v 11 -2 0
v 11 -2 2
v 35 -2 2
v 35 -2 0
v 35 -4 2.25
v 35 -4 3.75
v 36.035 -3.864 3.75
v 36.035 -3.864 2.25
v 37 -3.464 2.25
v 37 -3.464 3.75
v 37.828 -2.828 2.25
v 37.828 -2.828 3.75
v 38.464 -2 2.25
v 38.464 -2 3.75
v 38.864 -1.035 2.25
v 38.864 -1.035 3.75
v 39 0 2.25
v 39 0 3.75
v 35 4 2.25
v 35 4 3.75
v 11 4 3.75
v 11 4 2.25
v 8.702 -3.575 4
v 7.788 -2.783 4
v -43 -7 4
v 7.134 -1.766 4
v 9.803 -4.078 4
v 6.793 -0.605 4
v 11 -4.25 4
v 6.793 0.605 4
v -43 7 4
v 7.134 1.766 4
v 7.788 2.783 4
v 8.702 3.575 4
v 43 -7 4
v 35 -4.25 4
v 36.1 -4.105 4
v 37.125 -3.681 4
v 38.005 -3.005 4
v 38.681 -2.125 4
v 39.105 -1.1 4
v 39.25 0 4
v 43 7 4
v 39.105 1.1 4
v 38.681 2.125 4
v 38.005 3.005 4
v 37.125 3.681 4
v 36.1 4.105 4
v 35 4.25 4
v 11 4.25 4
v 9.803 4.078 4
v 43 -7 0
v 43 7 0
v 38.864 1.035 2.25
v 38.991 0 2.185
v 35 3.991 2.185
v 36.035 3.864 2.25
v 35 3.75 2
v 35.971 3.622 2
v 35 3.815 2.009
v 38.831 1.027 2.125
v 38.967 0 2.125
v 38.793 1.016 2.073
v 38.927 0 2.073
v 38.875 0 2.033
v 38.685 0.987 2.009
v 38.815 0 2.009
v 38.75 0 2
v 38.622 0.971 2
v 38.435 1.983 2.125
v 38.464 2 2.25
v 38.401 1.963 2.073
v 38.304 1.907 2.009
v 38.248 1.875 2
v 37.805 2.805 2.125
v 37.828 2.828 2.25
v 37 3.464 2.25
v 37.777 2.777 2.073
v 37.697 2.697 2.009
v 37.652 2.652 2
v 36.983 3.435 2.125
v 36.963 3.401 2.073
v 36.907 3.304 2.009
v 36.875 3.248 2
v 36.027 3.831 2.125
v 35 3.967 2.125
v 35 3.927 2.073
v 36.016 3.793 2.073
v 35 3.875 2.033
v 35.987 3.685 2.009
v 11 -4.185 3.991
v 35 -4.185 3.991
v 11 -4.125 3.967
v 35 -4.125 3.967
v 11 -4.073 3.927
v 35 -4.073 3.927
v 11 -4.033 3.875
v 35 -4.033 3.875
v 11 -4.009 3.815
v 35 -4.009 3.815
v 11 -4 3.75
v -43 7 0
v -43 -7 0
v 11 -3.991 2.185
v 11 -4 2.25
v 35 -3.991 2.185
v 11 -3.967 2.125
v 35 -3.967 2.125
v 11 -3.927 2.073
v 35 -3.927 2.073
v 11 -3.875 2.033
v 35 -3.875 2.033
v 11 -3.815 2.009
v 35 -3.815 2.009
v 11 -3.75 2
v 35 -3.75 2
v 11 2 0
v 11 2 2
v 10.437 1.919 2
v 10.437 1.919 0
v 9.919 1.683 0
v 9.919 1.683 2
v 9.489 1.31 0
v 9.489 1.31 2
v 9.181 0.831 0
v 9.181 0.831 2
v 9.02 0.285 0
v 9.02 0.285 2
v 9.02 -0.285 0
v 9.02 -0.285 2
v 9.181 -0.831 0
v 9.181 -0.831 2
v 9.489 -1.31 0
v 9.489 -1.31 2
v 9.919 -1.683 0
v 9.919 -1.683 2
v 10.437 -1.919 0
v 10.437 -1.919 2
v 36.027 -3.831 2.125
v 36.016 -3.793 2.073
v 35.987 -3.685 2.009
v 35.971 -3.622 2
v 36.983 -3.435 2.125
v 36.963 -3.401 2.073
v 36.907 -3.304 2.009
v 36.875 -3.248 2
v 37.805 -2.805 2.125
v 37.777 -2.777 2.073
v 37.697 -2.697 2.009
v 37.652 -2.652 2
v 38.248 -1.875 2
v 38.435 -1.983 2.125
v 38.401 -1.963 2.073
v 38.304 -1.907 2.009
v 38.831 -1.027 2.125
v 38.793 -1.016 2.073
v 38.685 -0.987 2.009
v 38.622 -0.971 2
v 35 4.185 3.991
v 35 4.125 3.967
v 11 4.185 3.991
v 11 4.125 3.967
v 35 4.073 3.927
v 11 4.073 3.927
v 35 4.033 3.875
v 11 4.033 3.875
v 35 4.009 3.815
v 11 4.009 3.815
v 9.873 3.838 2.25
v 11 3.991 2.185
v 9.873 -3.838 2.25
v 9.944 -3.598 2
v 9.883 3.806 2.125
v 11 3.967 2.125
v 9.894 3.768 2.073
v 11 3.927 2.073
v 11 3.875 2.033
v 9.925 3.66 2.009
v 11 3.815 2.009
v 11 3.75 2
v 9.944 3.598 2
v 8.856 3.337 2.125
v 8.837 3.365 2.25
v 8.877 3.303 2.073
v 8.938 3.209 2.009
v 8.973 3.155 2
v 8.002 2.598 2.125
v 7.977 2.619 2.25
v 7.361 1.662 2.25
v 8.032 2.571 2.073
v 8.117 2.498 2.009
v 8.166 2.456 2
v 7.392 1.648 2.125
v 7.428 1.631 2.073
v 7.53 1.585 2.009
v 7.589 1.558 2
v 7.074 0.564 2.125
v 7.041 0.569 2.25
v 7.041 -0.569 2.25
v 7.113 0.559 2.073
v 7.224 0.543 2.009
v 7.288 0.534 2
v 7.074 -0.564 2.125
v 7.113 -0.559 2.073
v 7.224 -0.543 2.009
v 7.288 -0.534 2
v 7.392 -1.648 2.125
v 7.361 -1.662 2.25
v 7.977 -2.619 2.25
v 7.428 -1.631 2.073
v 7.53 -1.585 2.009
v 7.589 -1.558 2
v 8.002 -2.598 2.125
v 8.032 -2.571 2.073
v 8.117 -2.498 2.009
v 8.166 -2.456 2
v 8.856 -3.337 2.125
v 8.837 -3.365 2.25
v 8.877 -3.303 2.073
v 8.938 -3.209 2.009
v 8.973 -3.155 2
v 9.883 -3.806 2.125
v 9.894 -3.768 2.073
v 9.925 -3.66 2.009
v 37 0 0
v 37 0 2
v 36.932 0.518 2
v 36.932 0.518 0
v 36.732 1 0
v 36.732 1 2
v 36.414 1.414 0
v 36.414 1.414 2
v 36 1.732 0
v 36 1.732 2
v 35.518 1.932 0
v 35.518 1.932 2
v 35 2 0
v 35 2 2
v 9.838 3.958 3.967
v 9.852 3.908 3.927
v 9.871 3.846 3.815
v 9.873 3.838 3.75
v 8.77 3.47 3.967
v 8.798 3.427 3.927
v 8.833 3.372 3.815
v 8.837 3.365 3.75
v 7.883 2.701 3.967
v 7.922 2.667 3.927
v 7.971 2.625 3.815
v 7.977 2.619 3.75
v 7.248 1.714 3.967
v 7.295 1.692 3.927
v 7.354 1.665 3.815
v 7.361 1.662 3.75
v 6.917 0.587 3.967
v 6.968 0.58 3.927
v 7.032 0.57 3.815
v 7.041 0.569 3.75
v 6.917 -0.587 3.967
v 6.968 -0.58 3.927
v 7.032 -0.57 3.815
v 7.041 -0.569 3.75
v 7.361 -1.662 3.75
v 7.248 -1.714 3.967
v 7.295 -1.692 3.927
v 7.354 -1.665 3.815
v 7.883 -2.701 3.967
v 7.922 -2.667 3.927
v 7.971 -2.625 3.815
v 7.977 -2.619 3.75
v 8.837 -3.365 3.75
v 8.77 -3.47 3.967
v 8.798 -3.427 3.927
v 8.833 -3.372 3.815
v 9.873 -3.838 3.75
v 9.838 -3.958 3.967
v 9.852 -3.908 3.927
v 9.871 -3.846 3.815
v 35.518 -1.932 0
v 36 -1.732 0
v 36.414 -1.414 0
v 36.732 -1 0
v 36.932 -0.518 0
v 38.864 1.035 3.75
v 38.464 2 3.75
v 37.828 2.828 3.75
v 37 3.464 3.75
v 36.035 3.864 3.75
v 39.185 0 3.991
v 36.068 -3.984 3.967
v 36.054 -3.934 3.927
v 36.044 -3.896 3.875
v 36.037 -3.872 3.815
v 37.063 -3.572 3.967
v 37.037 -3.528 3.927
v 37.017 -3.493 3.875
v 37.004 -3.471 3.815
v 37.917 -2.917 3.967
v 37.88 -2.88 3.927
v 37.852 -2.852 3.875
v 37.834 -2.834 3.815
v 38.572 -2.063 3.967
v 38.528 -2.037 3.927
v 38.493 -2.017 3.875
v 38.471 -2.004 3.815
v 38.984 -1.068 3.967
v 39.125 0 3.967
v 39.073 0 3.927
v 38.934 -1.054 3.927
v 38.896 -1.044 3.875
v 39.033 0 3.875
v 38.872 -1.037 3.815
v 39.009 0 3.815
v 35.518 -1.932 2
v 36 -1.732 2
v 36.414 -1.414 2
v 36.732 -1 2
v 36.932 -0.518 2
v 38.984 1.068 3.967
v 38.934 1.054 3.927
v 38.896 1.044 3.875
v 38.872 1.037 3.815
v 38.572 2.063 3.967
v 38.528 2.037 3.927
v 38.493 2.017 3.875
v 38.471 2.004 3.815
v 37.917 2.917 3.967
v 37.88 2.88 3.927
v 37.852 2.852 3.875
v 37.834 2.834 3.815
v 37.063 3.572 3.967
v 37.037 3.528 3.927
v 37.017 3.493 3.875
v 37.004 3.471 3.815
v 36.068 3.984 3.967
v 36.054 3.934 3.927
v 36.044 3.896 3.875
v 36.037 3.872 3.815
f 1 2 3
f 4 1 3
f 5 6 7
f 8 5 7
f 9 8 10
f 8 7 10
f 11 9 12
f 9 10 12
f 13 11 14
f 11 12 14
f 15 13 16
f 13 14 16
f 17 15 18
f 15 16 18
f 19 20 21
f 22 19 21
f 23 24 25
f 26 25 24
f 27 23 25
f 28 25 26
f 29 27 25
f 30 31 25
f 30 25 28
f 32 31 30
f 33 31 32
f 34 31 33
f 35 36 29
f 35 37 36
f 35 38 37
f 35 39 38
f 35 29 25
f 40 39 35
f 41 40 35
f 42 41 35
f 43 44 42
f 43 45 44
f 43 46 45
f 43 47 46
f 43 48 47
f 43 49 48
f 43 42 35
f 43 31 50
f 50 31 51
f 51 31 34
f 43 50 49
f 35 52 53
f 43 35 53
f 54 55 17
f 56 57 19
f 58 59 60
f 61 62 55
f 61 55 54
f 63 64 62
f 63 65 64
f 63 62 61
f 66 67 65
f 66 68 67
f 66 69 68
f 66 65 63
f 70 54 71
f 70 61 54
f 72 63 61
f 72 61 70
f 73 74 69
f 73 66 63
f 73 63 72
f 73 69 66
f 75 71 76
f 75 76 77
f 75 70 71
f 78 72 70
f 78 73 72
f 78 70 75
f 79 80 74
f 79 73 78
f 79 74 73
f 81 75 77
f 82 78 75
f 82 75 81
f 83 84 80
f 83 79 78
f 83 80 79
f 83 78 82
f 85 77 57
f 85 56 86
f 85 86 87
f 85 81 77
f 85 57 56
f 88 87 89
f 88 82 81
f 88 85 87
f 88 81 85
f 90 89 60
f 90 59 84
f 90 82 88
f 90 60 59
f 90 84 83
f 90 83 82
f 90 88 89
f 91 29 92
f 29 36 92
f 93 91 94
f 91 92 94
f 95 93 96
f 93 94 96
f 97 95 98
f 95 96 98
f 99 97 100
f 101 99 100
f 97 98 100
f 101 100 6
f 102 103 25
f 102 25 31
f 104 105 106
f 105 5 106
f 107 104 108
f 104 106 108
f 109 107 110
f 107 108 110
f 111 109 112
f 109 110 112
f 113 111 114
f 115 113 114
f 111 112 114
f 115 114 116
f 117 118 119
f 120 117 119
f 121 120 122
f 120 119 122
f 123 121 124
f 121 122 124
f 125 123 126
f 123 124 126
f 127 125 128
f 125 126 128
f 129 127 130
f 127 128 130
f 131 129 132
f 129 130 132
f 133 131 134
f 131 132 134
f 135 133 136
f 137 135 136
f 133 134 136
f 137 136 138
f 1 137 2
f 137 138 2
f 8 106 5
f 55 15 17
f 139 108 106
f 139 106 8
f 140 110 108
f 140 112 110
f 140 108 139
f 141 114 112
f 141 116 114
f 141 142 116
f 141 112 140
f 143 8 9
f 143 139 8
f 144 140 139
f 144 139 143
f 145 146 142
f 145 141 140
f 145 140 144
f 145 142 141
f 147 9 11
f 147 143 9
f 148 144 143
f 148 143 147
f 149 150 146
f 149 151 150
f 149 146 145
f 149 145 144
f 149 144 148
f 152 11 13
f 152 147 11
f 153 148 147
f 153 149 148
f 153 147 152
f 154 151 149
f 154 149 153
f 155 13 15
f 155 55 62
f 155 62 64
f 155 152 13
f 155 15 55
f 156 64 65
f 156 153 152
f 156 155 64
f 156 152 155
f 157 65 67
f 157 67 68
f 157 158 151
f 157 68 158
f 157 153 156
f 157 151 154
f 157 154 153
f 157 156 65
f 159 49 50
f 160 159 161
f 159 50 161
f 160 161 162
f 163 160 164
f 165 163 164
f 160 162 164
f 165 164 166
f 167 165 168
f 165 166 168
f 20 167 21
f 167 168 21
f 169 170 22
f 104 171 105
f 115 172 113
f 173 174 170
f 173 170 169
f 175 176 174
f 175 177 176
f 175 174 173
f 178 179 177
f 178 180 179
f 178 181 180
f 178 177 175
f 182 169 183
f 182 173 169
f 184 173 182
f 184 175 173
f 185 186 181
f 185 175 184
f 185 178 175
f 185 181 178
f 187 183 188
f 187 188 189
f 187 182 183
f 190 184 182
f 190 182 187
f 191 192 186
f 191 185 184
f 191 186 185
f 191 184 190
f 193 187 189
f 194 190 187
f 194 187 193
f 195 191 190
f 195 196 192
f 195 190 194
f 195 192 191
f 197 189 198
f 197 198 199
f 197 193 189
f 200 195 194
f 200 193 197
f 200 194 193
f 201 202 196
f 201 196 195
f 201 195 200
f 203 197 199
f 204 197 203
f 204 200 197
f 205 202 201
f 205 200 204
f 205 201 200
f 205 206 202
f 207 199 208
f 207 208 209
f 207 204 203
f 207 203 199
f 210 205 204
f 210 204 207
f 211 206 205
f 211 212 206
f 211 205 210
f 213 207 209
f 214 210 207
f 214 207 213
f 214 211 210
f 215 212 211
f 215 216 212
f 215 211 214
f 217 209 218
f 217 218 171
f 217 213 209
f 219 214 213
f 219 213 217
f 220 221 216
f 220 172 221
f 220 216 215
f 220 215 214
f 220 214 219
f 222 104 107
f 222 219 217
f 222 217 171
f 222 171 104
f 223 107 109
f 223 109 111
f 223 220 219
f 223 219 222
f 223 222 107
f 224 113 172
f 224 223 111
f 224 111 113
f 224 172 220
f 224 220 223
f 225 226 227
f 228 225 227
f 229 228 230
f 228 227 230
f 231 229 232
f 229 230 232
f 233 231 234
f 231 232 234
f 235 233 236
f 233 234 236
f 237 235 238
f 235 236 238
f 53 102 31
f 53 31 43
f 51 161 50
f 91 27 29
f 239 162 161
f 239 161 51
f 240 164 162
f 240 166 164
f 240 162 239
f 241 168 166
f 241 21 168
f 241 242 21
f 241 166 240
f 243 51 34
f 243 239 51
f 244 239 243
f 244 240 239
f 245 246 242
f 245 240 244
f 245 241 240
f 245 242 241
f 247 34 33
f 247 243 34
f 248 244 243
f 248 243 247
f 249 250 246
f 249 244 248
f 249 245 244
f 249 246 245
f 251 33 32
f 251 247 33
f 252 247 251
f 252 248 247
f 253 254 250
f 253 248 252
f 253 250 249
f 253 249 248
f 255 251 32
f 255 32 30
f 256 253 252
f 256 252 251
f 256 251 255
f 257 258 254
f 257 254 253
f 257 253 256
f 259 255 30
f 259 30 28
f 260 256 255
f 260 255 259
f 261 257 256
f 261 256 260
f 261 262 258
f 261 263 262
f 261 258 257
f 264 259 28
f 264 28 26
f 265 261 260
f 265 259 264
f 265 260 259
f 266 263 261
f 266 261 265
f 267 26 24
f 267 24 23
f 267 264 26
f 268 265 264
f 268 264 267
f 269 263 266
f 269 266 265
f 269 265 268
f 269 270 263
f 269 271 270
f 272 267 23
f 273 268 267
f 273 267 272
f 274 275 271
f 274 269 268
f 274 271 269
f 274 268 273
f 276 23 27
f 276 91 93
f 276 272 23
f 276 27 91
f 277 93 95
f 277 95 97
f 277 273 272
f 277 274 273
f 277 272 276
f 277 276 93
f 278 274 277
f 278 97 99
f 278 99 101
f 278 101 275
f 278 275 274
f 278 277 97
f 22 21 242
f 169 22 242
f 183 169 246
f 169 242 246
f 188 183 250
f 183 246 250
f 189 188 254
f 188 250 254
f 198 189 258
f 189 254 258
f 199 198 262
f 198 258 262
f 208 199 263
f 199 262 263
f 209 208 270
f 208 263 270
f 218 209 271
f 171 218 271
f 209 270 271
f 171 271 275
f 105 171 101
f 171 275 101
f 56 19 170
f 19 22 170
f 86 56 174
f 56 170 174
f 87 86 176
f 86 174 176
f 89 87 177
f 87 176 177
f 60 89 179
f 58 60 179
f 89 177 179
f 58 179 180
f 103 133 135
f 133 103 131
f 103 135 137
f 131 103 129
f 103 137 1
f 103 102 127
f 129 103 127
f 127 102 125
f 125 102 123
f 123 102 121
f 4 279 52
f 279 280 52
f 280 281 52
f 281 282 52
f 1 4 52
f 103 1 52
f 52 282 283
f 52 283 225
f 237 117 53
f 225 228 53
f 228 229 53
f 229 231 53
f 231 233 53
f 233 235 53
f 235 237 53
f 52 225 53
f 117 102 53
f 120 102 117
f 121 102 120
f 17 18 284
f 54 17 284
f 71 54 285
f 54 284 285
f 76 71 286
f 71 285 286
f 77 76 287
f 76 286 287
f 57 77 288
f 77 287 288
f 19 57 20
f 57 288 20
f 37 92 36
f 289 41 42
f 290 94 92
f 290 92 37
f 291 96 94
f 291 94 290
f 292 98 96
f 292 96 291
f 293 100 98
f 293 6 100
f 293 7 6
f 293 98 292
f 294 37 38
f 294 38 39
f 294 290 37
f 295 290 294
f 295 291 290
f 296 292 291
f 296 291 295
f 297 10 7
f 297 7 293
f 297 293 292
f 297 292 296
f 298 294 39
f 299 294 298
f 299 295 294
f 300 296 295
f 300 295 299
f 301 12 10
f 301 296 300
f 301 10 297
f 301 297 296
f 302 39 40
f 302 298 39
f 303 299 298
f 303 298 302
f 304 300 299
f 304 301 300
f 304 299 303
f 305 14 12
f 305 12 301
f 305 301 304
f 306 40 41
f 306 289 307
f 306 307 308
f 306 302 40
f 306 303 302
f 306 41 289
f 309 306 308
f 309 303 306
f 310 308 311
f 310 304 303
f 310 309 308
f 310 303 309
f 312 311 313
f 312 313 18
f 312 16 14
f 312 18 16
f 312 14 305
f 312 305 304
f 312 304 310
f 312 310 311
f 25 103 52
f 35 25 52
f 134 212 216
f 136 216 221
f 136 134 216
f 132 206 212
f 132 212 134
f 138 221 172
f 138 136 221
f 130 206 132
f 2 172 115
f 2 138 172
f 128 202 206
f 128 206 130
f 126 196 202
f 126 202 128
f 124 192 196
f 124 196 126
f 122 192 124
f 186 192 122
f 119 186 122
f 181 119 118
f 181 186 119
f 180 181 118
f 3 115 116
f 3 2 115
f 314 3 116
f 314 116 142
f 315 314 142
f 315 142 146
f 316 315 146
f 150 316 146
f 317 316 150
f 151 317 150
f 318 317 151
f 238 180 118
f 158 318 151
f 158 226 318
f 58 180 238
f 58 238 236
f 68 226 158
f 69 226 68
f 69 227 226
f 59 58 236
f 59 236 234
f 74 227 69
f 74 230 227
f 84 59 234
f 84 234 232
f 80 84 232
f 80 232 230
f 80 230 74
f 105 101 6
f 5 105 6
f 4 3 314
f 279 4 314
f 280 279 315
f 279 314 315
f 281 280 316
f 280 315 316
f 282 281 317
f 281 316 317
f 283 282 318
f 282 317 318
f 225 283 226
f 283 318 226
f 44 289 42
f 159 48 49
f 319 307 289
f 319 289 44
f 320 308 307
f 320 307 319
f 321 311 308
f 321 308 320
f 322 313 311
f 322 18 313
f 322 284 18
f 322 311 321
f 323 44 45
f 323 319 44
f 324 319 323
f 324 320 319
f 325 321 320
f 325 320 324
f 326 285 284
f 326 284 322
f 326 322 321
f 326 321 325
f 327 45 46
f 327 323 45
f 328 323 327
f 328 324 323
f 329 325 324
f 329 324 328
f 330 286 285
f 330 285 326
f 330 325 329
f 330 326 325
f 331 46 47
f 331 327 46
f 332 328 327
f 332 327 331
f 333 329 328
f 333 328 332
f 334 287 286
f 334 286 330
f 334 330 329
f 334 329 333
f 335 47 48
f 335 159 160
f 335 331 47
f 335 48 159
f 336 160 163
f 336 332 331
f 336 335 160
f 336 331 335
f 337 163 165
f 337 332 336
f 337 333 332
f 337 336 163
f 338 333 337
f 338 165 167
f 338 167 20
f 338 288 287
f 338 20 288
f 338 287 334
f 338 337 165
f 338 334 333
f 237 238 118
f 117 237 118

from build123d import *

# Parameters (mm, degrees)
F0_W     = 86
F0_H     = 14
F1_DEPTH = 4
F3_DEPTH = 4
F5_DEPTH = 2
F6_R     = 0.25


with BuildPart() as f1:
    # F0 (on Top) → F1 (new body)
    with BuildSketch(Plane.XY):
        Rectangle(F0_W, F0_H)
    extrude(amount=F1_DEPTH)

    # F2 (on face) → F3 (cut)
    with BuildSketch(Plane.XY.offset(4)):
        with BuildLine():
            ThreePointArc((35, -2), (36.4142139414, -1.4142137697), (37.0000005863, 0))
            ThreePointArc((37.0000005863, 0), (36.4142139414, 1.4142137697), (35, 2))
            Line((35, 2), (35, -2))
        make_face()
        with BuildLine():
            Line((35, -2), (35, 2))
            ThreePointArc((35, 2), (33.0000005863, 0), (35, -2))
        make_face()
        with BuildLine():
            ThreePointArc((35, -2), (33.0000005863, 0), (35, 2))
            Line((35, 2), (11, 2))
            ThreePointArc((11, 2), (12.4142135624, 1.4142135624), (13, 0))
            ThreePointArc((13, 0), (12.4142135624, -1.4142135624), (11, -2))
            Line((11, -2), (35, -2))
        make_face()
        with BuildLine():
            Line((11, -2), (11, 2))
            ThreePointArc((11, 2), (9, 0), (11, -2))
        make_face()
        with BuildLine():
            ThreePointArc((13, 0), (12.4142135624, 1.4142135624), (11, 2))
            Line((11, 2), (11, -2))
            ThreePointArc((11, -2), (12.4142135624, -1.4142135624), (13, 0))
        make_face()
    extrude(amount=-F3_DEPTH, mode=Mode.SUBTRACT)

    # F4 (on face) → F5 (cut)
    with BuildSketch(Plane.XY.offset(4)):
        with BuildLine():
            ThreePointArc((35.0000005863, -4), (37.8284277111, -2.8284271247), (39.0000005863, 0))
            ThreePointArc((39.0000005863, 0), (37.8284277111, 2.8284271247), (35.0000005863, 4))
            Line((35.0000005863, 4), (35.0000005863, -4))
        make_face()
        with BuildLine():
            Line((35.0000005863, -4), (35.0000005863, 4))
            ThreePointArc((35.0000005863, 4), (31.0000005863, 0), (35.0000005863, -4))
        make_face()
        with BuildLine():
            ThreePointArc((35.0000005863, -4), (31.0000005863, 0), (35.0000005863, 4))
            Line((35.0000005863, 4), (11.0000005863, 4))
            ThreePointArc((11.0000005863, 4), (13.828427332, 2.8284269175), (15, 0))
            ThreePointArc((15, 0), (13.828427332, -2.8284269175), (11.0000005863, -4))
            Line((11.0000005863, -4), (35.0000005863, -4))
        make_face()
        with BuildLine():
            Line((11.0000005863, -4), (11.0000005863, 4))
            ThreePointArc((11.0000005863, 4), (7, 0), (11.0000005863, -4))
        make_face()
        with BuildLine():
            ThreePointArc((15, 0), (13.828427332, 2.8284269175), (11.0000005863, 4))
            Line((11.0000005863, 4), (11.0000005863, -4))
            ThreePointArc((11.0000005863, -4), (13.828427332, -2.8284269175), (15, 0))
        make_face()
    extrude(amount=-F5_DEPTH, mode=Mode.SUBTRACT)

    # F6
    f6_edges = [f1.edges().sort_by_distance(p)[0] for p in [
        (23.000001, 4, 2),
        (7, 0, 2),
        (23.000001, -4, 2),
        (39.000001, 0, 2),
        (23.000001, -4, 4),
        (7, 0, 4),
        (23.000001, 4, 4),
        (39.000001, 0, 4),
    ]]
    fillet(f6_edges, radius=F6_R)


solid = f1.part
